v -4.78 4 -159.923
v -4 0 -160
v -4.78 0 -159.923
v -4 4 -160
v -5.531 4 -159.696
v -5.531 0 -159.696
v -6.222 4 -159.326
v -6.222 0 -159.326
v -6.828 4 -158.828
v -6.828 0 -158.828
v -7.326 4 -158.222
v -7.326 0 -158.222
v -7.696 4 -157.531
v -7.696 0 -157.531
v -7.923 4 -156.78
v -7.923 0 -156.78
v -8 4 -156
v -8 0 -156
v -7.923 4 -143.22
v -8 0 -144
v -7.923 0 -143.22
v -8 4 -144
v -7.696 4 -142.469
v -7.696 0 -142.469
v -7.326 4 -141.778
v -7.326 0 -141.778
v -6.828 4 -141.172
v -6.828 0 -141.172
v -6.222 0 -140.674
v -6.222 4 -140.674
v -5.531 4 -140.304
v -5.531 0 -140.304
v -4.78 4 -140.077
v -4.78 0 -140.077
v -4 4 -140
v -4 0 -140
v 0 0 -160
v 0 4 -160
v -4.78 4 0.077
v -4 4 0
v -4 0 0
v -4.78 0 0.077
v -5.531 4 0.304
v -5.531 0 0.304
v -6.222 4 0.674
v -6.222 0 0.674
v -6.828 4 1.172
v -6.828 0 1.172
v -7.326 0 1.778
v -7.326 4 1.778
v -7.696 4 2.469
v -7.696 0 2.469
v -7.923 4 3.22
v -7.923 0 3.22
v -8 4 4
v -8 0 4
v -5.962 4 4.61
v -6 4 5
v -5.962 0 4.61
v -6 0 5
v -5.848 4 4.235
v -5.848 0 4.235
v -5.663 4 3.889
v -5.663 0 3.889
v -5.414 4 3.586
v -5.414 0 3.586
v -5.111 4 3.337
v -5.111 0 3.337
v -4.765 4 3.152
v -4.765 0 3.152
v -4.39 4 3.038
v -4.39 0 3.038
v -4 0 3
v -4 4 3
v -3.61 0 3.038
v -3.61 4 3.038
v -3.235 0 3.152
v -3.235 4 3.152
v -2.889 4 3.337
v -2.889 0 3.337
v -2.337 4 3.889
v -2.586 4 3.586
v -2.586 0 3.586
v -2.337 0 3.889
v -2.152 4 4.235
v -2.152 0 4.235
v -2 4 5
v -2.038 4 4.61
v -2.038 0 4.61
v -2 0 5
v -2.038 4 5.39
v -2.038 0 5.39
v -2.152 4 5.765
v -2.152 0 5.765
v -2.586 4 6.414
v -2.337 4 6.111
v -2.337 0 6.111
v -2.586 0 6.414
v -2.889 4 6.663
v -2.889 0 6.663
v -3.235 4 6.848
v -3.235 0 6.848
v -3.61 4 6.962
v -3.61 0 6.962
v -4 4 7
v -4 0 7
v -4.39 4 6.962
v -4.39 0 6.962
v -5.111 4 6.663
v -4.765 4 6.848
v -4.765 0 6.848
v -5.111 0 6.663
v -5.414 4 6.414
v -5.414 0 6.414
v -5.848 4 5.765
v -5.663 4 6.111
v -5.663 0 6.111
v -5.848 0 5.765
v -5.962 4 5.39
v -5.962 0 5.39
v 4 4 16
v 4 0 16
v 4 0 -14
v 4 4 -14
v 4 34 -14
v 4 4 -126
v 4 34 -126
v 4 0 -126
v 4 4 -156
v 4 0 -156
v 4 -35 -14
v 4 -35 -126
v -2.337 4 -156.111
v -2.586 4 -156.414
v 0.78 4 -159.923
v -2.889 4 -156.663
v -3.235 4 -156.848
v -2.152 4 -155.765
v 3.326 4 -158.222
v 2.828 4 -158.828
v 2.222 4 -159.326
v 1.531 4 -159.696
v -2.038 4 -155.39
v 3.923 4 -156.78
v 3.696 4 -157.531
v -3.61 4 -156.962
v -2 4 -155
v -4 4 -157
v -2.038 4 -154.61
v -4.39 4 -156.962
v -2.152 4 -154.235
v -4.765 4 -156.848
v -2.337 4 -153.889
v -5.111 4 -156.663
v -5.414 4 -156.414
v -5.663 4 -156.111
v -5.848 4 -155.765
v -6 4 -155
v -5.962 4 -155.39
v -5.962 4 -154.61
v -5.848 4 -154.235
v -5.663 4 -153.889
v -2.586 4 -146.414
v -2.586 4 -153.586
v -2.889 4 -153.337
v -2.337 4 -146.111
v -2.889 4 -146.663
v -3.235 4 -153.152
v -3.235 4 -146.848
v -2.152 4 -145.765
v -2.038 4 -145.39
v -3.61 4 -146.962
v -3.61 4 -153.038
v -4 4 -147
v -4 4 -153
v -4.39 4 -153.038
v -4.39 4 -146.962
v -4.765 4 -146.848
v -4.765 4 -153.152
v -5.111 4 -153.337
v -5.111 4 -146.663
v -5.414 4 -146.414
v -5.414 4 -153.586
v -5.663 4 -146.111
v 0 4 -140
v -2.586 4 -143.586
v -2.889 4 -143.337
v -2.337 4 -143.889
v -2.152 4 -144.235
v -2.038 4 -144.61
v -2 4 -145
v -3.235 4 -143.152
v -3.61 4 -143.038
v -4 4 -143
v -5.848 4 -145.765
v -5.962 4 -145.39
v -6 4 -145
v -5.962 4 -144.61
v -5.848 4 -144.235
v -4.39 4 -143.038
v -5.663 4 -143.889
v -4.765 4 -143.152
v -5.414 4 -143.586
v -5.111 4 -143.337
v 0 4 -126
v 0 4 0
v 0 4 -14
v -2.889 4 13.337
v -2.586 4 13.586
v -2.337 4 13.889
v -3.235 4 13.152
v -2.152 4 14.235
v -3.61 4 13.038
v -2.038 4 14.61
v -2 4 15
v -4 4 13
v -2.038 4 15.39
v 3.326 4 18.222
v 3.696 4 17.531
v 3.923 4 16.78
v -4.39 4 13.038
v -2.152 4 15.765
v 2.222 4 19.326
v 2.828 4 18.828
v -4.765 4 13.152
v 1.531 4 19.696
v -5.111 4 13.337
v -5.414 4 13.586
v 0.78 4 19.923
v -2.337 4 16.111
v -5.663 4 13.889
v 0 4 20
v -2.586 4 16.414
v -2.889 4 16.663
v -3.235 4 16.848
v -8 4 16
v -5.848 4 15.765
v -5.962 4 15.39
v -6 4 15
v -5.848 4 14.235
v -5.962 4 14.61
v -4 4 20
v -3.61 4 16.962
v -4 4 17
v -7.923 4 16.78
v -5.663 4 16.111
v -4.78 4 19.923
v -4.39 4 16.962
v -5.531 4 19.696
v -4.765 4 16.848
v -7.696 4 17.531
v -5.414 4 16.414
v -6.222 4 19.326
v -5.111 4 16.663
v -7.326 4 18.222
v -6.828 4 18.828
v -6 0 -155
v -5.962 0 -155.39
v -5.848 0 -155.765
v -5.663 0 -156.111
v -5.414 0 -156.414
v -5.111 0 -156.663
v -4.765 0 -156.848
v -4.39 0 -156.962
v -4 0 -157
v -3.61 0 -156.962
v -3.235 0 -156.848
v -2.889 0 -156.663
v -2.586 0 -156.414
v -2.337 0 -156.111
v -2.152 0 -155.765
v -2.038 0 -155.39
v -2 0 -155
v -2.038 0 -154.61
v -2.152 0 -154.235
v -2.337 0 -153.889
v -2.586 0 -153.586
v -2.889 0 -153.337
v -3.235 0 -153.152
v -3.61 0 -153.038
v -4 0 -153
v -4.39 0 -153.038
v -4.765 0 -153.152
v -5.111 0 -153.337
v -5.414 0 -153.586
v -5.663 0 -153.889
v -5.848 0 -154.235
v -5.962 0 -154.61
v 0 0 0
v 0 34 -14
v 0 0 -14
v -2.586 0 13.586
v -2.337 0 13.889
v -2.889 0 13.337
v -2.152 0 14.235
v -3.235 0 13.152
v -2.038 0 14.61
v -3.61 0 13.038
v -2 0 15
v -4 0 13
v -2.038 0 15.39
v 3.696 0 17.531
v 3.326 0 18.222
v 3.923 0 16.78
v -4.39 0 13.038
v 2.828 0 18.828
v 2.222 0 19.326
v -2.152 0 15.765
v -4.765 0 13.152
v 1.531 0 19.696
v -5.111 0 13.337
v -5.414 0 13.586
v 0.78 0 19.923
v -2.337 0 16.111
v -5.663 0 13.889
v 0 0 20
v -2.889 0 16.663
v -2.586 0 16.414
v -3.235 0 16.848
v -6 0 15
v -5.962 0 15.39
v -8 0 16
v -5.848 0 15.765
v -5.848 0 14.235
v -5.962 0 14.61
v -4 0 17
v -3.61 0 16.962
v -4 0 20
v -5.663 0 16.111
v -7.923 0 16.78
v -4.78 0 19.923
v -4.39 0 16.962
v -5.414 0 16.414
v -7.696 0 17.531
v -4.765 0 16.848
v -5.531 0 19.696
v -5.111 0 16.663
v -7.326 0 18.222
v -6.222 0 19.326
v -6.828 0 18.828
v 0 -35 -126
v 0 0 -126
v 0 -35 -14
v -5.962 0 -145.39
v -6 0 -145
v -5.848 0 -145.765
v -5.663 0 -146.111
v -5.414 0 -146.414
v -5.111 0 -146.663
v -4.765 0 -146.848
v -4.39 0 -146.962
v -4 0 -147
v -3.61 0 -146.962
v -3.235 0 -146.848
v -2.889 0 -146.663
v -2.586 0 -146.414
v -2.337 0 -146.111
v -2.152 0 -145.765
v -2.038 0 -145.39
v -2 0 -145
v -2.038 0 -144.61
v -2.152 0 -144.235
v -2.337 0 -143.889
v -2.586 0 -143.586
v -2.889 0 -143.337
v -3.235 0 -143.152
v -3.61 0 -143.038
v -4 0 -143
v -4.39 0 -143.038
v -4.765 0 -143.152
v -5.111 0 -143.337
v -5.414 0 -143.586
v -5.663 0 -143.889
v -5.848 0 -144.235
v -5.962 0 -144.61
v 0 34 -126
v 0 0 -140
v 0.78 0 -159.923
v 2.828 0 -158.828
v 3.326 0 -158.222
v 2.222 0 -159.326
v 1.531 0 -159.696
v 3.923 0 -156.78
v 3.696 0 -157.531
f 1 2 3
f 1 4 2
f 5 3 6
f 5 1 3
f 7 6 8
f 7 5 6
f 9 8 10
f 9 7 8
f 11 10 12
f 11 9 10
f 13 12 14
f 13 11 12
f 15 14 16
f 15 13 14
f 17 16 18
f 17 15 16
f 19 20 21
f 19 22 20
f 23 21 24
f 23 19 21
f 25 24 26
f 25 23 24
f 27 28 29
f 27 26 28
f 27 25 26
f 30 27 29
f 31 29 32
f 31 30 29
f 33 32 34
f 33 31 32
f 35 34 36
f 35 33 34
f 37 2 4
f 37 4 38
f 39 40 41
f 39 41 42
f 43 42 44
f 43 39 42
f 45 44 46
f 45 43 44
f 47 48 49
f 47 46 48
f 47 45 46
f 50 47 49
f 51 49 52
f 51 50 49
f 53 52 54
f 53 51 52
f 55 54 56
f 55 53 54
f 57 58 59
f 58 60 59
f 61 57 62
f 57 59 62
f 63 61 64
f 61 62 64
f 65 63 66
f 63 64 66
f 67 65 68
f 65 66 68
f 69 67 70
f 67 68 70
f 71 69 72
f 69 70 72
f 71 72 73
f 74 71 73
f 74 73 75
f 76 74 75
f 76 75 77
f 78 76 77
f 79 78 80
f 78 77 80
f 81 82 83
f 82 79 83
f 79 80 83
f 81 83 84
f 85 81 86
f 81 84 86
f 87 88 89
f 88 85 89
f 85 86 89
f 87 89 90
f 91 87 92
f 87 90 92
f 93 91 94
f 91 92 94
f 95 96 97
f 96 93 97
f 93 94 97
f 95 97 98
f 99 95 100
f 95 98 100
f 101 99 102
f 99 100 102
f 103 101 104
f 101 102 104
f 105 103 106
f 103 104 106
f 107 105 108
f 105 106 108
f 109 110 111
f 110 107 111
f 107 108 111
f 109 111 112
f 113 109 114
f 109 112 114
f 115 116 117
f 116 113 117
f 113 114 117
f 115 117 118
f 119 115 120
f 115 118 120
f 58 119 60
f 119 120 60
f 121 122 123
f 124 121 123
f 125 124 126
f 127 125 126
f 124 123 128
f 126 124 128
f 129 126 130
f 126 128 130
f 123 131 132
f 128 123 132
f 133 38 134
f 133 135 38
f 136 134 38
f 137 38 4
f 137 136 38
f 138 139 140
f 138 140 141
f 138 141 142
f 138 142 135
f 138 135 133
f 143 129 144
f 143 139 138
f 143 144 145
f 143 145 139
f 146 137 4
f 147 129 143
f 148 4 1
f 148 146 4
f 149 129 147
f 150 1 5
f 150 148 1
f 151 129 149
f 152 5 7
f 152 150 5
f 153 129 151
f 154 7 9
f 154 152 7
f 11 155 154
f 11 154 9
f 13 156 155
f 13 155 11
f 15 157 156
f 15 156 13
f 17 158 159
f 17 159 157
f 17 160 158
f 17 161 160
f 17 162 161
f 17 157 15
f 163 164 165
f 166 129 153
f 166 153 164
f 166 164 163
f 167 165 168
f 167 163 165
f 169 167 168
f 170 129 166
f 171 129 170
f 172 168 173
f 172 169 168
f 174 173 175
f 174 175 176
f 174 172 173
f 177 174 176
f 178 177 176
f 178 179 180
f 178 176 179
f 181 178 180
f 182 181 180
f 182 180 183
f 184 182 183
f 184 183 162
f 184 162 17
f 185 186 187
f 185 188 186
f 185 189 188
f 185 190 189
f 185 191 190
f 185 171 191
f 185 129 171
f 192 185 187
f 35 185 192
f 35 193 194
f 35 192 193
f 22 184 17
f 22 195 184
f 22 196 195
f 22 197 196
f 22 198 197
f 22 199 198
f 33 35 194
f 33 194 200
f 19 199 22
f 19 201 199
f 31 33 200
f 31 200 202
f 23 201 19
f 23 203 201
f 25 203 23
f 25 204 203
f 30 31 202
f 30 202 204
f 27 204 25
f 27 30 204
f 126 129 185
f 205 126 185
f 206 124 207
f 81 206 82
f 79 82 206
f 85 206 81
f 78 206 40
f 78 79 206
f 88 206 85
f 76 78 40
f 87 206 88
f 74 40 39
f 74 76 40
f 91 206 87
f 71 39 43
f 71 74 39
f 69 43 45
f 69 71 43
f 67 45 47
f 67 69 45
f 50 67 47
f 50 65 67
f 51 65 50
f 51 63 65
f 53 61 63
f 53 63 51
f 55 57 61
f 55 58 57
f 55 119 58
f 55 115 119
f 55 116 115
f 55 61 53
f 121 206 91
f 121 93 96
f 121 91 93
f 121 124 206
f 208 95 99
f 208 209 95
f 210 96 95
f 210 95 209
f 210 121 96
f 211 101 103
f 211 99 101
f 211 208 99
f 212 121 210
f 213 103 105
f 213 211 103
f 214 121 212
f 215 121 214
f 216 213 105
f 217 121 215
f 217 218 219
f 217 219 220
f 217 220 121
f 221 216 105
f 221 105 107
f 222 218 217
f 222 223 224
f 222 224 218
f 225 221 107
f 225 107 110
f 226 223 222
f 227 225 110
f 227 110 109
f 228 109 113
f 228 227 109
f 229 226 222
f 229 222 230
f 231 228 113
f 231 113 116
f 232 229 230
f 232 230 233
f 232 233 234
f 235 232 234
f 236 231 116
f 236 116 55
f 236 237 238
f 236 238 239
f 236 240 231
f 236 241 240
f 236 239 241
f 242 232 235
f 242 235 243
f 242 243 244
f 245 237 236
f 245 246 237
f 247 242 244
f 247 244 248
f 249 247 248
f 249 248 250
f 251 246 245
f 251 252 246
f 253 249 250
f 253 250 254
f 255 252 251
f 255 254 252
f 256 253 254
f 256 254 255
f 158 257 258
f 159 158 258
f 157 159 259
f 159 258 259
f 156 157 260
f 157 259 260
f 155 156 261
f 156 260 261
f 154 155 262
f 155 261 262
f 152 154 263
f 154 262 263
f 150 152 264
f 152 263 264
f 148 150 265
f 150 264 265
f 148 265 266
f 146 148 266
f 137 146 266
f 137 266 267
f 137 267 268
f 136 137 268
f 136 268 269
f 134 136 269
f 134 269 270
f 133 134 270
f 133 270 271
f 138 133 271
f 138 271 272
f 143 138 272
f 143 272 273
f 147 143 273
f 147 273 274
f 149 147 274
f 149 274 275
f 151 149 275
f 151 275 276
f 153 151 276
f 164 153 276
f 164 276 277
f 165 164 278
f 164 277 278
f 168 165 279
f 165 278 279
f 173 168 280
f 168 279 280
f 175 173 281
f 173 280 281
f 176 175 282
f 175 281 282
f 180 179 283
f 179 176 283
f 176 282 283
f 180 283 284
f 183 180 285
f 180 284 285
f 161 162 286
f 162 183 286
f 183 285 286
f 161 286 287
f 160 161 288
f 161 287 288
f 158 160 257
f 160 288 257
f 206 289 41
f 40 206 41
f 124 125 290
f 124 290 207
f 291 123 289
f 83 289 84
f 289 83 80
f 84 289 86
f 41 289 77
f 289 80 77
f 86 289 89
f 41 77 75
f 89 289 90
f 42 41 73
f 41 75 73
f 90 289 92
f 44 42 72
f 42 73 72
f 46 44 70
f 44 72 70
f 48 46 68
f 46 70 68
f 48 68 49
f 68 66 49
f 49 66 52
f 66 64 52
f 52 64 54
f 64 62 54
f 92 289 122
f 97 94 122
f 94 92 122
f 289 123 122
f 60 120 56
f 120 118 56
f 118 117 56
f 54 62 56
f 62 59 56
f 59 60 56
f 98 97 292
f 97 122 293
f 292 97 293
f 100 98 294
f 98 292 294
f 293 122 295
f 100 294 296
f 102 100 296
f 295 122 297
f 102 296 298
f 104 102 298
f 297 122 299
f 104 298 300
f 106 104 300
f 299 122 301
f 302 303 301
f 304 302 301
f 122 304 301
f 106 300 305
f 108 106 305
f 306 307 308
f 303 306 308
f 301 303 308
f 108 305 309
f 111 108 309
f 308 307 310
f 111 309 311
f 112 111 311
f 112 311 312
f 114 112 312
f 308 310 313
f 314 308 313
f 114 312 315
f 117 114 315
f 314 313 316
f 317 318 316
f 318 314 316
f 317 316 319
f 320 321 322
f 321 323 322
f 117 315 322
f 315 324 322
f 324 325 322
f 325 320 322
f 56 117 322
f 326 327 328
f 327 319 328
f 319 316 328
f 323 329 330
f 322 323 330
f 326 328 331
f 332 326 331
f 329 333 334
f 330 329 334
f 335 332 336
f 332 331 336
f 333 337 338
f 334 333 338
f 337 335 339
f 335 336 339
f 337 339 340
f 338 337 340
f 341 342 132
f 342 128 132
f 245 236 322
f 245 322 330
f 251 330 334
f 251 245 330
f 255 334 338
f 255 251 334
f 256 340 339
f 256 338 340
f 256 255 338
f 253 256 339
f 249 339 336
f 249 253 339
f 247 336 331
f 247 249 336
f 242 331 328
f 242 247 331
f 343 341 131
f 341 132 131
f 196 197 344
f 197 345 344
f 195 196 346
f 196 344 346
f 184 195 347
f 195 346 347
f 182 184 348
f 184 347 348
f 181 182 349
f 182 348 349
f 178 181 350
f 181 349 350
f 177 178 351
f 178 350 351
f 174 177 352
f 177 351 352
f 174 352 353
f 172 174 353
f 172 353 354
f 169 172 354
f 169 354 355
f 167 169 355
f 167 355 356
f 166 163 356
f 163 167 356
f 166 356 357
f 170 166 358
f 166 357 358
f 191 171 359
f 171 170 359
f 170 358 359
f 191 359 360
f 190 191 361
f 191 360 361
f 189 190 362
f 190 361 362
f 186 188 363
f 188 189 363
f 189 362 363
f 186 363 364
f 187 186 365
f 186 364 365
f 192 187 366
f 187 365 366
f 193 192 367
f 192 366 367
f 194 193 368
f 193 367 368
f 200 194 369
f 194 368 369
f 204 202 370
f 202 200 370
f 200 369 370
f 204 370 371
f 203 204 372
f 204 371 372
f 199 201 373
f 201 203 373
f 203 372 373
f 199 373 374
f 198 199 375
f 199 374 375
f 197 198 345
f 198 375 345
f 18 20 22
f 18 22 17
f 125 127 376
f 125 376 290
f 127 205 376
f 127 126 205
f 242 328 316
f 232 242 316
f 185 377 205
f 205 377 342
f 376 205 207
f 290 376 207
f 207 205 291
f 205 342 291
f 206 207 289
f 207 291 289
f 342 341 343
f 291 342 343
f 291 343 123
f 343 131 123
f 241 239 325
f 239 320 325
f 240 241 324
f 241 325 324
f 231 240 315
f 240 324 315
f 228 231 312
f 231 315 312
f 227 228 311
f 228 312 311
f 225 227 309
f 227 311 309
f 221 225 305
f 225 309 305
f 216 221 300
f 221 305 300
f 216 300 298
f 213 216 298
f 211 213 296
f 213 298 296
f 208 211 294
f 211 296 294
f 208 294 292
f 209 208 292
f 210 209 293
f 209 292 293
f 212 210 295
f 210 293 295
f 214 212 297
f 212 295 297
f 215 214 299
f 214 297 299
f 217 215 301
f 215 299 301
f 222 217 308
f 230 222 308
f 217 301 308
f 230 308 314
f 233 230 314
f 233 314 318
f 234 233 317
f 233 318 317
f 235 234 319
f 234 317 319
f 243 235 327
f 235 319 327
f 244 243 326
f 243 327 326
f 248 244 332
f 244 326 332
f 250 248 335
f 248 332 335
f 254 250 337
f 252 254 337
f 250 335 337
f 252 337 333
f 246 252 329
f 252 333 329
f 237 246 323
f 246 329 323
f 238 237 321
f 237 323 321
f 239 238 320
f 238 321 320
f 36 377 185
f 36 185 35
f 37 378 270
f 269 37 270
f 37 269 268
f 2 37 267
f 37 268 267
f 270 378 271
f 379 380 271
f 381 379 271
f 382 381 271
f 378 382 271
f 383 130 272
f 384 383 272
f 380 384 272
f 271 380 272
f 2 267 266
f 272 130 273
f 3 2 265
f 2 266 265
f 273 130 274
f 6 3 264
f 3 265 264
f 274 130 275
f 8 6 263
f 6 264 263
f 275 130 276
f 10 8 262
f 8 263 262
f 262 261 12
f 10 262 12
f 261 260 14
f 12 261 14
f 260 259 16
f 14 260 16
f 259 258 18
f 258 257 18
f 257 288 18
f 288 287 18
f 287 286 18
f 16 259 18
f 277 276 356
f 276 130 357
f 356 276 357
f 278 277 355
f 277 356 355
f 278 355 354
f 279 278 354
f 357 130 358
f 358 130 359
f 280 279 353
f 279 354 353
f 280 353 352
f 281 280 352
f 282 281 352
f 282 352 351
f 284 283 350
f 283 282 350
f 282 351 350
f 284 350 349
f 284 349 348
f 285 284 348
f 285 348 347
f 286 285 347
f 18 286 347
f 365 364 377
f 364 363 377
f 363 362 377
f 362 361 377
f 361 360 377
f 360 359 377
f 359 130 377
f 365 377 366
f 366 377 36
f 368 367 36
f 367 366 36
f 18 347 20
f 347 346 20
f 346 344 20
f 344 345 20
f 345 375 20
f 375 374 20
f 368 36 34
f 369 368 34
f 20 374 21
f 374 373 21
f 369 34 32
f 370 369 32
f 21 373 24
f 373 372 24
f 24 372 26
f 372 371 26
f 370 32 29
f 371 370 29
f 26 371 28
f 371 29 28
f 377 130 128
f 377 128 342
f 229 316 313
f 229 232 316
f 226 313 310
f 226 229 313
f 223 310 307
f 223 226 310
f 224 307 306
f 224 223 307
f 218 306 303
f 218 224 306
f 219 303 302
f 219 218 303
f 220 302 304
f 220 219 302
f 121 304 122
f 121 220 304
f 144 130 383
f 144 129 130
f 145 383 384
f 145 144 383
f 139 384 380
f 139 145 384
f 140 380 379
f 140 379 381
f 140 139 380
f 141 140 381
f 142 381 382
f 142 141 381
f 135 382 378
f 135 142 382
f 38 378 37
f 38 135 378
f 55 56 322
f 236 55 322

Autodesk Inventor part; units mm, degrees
ref_plane "YZ Plane" through (0, 0, 0) normal (1, 0, 0) x (0, 1, 0)
ref_plane "XZ Plane" through (0, 0, 0) normal (0, 1, 0) x (-1, 0, 0)
ref_plane "XY Plane" through (0, 0, 0) normal (0, 0, 1) x (1, 0, 0)
sketch "Sketch1" plane through (0, 0, 0) normal (0, 1, 0) x (-1, 0, 0)
  line L0 (0, 0) -> (8, 0)
  line L1 (8, 0) -> (8, 20)
  line L2 (8, 20) -> (0, 20)
  line L3 (0, 20) -> (0, 0)
  line L4 (8, 20) -> (4, 20)
  line L5 (4, 20) -> (4, 15)
  line L6 (4, 15) -> (8, 15)
  line L7 (8, 15) -> (8, 20)
  line L8 (4, 15) -> (4, 5)
  circle A0 centre (4, 15) radius 2
  circle A1 centre (4, 5) radius 2
  line L9 (0, 20) -> (-4, 20)
  line L10 (-4, 20) -> (-4, -70)
  line L11 (-4, -70) -> (0, -70)
  line L12 (0, -70) -> (0, 20)
  line L13 (0, -140) -> (8, -140)
  line L14 (8, -140) -> (8, -160)
  line L15 (8, -160) -> (0, -160)
  line L16 (0, -160) -> (0, -140)
  line L17 (8, -160) -> (4, -160)
  line L18 (4, -160) -> (4, -155)
  line L19 (4, -155) -> (8, -155)
  line L20 (8, -155) -> (8, -160)
  line L21 (4, -155) -> (4, -145)
  circle A2 centre (4, -155) radius 2
  circle A3 centre (4, -145) radius 2
  line L22 (0, -160) -> (-4, -160)
  line L23 (-4, -160) -> (-4, -70)
  line L24 (0, -70) -> (0, -160)
  dimension "d0" = 8
  dimension "d1" = 20
  dimension "d2" = 4
  dimension "d3" = 5
  dimension "d4" = 10
  dimension "d5" = 4
  dimension "d6" = 4
extrude "Extrusion1" add sketch "Sketch1" along normal blind 4 contours L3 L2 L5 A0 L6 L1 L0 | L12 L11 L10 L9 L3 | L24 L16 L22 L23 L11 | L6 A0 L5 L2 L1 | L13 L14 L19 A2 L18 L15 L16 | L14 L15 L18 A2 L19
fillet "Fillet1" radius 4 6 edges at (-8, 2, -140) (-8, 2, -160) (4, 2, -160) (4, 2, 20) (-8, 2, 20) (-8, 2, 0)
sketch "Sketch2" plane through (4, 0, 16) normal (1, 0, 0) x (0, 0, -1)
  line L0 (-4, 4) -> (0, 4) projected
  line L1 (0, 4) -> (30, 4)
  line L2 (156, 4) -> (16, 4) projected
  line L3 (172, 4) -> (172, 0) projected
  line L4 (172, 4) -> (142, 4)
  line L5 (30, 4) -> (142, 4)
  line L6 (142, 4) -> (142, 34)
  line L7 (142, 34) -> (30, 34)
  line L8 (30, 34) -> (30, 4)
  line L9 (156, 0) -> (16, 0) projected
  line L10 (30, 0) -> (142, 0)
  line L11 (142, 0) -> (142, -35)
  line L12 (142, -35) -> (30, -35)
  line L13 (30, -35) -> (30, 0)
  dimension "d12" = 30
  dimension "d13" = 30
  dimension "d14" = 30
  dimension "d15" = 35
extrude "Extrusion2" add sketch "Sketch2" against normal up to surface (4 mm away)
properties part number "rigid_support2"
